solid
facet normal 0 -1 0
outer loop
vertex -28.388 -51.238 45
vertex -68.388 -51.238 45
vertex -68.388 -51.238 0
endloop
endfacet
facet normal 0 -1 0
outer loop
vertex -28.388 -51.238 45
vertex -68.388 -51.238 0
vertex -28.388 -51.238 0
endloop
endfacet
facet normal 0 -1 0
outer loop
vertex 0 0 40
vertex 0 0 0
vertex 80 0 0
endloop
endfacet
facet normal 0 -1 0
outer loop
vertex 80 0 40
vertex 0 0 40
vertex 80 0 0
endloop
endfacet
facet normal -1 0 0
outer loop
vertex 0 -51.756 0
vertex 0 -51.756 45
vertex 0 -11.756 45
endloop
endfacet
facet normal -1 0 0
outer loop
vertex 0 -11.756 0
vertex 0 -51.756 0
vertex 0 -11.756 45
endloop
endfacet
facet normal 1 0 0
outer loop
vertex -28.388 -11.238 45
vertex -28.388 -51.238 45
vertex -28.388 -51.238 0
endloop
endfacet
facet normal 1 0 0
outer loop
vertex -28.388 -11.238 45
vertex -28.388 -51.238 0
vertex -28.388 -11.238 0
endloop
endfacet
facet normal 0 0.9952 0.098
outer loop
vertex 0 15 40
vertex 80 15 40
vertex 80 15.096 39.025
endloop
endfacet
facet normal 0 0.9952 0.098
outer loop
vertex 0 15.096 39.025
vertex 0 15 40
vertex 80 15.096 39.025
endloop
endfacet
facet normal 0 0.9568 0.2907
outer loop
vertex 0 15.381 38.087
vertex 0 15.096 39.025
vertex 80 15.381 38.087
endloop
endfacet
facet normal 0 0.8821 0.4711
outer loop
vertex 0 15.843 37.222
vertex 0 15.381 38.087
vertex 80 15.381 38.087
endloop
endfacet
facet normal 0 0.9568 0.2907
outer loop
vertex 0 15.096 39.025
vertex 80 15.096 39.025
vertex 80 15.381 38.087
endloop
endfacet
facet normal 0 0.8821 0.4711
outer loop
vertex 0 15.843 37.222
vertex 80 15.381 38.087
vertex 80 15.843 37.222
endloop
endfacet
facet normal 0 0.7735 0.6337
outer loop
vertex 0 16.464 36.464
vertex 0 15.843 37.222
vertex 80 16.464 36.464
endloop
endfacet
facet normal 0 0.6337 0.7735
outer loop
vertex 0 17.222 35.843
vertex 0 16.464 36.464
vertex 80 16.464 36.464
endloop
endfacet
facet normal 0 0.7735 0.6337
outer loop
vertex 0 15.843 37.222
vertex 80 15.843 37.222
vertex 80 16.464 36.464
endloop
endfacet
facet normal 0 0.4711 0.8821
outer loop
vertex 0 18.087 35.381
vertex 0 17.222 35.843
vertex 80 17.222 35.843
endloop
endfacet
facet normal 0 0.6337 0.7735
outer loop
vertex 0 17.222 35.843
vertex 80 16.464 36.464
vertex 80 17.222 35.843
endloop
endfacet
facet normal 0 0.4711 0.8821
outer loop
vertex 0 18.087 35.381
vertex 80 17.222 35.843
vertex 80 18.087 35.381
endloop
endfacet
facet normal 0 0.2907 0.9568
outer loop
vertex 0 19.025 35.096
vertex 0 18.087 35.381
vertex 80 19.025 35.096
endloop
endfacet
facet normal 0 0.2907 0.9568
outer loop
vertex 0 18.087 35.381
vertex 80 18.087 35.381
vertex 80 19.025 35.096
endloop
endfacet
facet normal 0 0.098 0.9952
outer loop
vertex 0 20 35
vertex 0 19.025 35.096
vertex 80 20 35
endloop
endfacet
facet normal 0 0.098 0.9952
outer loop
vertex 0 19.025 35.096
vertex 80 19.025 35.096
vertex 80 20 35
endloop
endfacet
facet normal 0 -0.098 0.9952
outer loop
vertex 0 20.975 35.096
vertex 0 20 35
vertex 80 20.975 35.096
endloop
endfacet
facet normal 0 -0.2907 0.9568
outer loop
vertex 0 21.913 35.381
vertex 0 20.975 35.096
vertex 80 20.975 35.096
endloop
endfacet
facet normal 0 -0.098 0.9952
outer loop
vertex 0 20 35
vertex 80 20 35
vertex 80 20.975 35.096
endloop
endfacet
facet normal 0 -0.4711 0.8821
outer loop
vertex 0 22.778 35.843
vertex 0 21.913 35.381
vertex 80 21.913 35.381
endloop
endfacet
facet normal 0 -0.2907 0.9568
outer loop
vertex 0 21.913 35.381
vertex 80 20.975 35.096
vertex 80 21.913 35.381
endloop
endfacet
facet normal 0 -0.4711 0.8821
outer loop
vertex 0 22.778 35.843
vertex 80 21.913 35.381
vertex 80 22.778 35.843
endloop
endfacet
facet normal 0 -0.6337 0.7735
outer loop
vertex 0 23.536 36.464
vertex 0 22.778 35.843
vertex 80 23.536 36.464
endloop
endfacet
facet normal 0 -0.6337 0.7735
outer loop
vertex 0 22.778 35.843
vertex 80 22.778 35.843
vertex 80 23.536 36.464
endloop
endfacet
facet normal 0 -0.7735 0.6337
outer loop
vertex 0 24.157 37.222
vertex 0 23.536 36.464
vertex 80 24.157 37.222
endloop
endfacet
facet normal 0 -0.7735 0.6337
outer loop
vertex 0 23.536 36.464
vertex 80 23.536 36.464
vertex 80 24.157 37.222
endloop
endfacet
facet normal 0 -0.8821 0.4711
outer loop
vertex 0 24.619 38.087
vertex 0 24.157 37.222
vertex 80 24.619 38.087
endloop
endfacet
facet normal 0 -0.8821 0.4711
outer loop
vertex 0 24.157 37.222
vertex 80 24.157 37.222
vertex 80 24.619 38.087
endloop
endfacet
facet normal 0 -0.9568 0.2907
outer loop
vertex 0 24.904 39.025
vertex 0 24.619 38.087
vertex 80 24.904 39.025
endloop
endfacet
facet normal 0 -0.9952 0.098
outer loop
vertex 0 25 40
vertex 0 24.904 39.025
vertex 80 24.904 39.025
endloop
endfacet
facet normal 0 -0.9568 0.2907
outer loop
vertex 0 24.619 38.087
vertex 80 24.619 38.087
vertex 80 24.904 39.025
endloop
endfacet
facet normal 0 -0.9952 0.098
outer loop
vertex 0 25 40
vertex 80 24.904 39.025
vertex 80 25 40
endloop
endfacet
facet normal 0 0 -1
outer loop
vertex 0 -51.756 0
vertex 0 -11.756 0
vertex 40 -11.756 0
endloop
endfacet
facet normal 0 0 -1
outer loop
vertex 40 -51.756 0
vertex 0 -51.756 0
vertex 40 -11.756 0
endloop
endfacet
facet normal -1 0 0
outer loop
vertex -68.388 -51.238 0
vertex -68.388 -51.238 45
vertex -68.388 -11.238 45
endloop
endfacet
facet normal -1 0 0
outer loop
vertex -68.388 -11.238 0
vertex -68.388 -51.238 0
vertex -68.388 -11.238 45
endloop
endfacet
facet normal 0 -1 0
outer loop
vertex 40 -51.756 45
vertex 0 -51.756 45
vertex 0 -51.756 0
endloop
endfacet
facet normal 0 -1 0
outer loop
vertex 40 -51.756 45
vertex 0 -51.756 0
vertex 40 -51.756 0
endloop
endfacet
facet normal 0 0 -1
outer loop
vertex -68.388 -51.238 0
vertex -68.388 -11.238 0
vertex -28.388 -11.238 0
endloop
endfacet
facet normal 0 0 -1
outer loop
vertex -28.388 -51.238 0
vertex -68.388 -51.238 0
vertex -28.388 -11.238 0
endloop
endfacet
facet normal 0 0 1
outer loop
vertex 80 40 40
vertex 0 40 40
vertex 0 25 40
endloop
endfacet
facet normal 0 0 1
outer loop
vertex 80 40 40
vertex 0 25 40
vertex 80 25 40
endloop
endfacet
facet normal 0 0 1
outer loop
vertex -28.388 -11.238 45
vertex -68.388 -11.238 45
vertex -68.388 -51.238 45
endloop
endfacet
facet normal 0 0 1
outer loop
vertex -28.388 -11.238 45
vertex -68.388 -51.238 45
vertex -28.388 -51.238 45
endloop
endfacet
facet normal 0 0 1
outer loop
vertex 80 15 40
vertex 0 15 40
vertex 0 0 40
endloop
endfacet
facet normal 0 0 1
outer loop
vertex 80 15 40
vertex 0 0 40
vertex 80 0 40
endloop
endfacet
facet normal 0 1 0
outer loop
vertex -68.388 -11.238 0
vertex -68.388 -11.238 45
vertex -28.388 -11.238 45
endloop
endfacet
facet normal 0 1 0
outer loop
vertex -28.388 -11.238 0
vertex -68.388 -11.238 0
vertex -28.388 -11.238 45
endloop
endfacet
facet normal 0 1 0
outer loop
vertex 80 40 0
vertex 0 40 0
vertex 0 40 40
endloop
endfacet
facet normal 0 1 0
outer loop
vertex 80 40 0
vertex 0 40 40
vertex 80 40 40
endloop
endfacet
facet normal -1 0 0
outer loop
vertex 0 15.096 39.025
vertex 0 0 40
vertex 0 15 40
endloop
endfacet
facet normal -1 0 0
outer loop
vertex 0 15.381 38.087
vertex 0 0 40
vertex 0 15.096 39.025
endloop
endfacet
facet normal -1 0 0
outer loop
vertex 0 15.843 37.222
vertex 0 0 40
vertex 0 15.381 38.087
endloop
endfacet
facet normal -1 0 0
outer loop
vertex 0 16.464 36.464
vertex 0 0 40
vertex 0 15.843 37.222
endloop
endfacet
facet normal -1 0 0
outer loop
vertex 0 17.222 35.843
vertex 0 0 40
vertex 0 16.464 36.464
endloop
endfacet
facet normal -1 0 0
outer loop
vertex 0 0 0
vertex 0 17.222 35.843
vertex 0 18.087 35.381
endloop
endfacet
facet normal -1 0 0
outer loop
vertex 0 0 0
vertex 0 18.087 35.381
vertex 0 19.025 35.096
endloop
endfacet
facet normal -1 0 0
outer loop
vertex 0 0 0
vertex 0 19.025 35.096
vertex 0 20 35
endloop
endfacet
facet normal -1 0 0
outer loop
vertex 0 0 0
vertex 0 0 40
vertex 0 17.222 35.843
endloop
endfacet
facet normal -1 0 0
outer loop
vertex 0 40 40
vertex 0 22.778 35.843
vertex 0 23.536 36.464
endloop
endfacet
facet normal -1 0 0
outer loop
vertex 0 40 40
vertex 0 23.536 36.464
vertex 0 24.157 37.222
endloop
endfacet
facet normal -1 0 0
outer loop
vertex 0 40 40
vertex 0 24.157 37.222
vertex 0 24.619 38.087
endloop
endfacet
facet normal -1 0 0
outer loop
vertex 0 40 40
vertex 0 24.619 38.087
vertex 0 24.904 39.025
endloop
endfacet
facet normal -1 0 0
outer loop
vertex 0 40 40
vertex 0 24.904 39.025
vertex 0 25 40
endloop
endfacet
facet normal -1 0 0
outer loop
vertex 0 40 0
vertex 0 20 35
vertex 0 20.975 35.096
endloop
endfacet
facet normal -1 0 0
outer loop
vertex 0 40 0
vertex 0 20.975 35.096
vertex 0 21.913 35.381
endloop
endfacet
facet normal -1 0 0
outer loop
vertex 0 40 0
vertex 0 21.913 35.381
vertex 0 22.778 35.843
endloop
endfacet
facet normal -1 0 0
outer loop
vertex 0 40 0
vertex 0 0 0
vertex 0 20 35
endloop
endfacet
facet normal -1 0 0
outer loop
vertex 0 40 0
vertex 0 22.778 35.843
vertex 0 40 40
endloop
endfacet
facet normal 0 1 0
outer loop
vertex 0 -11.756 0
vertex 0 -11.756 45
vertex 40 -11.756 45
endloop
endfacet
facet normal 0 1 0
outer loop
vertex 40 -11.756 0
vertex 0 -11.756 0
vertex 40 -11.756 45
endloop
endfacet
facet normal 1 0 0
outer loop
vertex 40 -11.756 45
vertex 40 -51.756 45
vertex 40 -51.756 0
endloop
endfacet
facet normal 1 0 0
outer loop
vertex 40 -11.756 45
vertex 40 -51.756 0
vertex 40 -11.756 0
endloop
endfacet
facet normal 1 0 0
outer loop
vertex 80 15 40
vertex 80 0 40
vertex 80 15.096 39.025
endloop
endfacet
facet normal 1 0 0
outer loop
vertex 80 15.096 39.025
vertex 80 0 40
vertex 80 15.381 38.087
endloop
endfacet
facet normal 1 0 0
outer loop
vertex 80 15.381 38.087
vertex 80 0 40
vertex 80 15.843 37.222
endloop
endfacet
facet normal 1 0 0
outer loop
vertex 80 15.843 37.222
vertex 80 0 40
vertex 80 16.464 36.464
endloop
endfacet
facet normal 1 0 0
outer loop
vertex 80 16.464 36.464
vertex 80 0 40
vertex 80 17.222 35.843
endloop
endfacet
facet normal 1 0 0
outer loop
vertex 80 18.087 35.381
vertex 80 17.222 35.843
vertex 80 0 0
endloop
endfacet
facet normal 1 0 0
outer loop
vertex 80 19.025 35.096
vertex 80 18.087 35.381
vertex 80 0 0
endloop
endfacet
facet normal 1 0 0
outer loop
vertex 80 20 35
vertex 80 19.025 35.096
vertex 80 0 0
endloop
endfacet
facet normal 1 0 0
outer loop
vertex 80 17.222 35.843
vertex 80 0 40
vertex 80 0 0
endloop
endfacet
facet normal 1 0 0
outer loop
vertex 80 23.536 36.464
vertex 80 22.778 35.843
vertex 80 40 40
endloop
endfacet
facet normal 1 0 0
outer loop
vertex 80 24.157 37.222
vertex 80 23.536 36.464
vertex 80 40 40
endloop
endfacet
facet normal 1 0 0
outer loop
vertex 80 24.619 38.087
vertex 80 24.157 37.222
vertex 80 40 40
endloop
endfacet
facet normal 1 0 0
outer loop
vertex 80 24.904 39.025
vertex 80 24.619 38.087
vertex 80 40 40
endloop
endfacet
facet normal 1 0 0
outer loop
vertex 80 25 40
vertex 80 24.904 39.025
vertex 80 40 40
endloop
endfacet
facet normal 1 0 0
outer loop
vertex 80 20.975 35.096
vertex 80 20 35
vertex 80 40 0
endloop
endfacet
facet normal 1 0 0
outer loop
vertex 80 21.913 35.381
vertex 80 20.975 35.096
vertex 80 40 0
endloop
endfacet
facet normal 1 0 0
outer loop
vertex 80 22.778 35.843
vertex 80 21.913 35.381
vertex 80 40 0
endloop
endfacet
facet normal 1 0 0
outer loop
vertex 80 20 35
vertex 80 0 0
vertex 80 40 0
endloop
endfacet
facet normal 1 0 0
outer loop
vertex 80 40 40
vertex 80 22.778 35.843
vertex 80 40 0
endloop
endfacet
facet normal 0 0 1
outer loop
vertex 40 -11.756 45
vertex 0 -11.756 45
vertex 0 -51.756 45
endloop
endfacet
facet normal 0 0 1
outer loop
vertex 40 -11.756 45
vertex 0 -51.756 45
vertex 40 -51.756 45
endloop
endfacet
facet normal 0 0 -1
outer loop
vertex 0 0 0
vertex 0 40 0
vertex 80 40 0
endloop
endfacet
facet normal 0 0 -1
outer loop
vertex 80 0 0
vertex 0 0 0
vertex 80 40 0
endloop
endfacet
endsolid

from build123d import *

# Parameters (mm, degrees)
F0_W     = 80
F0_H     = 40
F1_DEPTH = 40
F2_R     = 5
F3_DEPTH = 80
F4_W     = 40
F4_H     = 40
F5_DEPTH = 45


with BuildPart() as f1:
    # F0 (on Top) → F1 (new body)
    with BuildSketch(Plane.XY):
        with Locations((40, 20)):
            Rectangle(F0_W, F0_H)
    extrude(amount=F1_DEPTH)

    # F2 (on face) → F3 (cut)
    with BuildSketch(Plane.YZ.offset(80)):
        with Locations((20, 40)):
            Circle(F2_R)
    extrude(amount=-F3_DEPTH, mode=Mode.SUBTRACT)


with BuildPart() as f5:
    # F4 (on Top) → F5 (new body)
    with BuildSketch(Plane.XY):
        with Locations((20, -31.755678)):
            Rectangle(F4_W, F4_H)
        with Locations((-48.388003, -31.237728)):
            Rectangle(F4_W, F4_H)
    extrude(amount=F5_DEPTH)


solid = Compound([f1.part, f5.part])
